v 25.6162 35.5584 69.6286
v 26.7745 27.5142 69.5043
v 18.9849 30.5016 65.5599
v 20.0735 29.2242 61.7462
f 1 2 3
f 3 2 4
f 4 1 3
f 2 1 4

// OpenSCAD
// Auto-generated auxetic polyhedron
points = [
    [18.984943, 30.501584, 65.559857],
    [26.774497, 27.514203, 69.504344],
    [25.616153, 35.558425, 69.628580],
    [20.073535, 29.224179, 61.746175],
];

faces = [
    [0, 1, 2],
    [3, 1, 0],
    [0, 2, 3],
    [3, 2, 1],
];

polyhedron(points = points, faces = faces);
